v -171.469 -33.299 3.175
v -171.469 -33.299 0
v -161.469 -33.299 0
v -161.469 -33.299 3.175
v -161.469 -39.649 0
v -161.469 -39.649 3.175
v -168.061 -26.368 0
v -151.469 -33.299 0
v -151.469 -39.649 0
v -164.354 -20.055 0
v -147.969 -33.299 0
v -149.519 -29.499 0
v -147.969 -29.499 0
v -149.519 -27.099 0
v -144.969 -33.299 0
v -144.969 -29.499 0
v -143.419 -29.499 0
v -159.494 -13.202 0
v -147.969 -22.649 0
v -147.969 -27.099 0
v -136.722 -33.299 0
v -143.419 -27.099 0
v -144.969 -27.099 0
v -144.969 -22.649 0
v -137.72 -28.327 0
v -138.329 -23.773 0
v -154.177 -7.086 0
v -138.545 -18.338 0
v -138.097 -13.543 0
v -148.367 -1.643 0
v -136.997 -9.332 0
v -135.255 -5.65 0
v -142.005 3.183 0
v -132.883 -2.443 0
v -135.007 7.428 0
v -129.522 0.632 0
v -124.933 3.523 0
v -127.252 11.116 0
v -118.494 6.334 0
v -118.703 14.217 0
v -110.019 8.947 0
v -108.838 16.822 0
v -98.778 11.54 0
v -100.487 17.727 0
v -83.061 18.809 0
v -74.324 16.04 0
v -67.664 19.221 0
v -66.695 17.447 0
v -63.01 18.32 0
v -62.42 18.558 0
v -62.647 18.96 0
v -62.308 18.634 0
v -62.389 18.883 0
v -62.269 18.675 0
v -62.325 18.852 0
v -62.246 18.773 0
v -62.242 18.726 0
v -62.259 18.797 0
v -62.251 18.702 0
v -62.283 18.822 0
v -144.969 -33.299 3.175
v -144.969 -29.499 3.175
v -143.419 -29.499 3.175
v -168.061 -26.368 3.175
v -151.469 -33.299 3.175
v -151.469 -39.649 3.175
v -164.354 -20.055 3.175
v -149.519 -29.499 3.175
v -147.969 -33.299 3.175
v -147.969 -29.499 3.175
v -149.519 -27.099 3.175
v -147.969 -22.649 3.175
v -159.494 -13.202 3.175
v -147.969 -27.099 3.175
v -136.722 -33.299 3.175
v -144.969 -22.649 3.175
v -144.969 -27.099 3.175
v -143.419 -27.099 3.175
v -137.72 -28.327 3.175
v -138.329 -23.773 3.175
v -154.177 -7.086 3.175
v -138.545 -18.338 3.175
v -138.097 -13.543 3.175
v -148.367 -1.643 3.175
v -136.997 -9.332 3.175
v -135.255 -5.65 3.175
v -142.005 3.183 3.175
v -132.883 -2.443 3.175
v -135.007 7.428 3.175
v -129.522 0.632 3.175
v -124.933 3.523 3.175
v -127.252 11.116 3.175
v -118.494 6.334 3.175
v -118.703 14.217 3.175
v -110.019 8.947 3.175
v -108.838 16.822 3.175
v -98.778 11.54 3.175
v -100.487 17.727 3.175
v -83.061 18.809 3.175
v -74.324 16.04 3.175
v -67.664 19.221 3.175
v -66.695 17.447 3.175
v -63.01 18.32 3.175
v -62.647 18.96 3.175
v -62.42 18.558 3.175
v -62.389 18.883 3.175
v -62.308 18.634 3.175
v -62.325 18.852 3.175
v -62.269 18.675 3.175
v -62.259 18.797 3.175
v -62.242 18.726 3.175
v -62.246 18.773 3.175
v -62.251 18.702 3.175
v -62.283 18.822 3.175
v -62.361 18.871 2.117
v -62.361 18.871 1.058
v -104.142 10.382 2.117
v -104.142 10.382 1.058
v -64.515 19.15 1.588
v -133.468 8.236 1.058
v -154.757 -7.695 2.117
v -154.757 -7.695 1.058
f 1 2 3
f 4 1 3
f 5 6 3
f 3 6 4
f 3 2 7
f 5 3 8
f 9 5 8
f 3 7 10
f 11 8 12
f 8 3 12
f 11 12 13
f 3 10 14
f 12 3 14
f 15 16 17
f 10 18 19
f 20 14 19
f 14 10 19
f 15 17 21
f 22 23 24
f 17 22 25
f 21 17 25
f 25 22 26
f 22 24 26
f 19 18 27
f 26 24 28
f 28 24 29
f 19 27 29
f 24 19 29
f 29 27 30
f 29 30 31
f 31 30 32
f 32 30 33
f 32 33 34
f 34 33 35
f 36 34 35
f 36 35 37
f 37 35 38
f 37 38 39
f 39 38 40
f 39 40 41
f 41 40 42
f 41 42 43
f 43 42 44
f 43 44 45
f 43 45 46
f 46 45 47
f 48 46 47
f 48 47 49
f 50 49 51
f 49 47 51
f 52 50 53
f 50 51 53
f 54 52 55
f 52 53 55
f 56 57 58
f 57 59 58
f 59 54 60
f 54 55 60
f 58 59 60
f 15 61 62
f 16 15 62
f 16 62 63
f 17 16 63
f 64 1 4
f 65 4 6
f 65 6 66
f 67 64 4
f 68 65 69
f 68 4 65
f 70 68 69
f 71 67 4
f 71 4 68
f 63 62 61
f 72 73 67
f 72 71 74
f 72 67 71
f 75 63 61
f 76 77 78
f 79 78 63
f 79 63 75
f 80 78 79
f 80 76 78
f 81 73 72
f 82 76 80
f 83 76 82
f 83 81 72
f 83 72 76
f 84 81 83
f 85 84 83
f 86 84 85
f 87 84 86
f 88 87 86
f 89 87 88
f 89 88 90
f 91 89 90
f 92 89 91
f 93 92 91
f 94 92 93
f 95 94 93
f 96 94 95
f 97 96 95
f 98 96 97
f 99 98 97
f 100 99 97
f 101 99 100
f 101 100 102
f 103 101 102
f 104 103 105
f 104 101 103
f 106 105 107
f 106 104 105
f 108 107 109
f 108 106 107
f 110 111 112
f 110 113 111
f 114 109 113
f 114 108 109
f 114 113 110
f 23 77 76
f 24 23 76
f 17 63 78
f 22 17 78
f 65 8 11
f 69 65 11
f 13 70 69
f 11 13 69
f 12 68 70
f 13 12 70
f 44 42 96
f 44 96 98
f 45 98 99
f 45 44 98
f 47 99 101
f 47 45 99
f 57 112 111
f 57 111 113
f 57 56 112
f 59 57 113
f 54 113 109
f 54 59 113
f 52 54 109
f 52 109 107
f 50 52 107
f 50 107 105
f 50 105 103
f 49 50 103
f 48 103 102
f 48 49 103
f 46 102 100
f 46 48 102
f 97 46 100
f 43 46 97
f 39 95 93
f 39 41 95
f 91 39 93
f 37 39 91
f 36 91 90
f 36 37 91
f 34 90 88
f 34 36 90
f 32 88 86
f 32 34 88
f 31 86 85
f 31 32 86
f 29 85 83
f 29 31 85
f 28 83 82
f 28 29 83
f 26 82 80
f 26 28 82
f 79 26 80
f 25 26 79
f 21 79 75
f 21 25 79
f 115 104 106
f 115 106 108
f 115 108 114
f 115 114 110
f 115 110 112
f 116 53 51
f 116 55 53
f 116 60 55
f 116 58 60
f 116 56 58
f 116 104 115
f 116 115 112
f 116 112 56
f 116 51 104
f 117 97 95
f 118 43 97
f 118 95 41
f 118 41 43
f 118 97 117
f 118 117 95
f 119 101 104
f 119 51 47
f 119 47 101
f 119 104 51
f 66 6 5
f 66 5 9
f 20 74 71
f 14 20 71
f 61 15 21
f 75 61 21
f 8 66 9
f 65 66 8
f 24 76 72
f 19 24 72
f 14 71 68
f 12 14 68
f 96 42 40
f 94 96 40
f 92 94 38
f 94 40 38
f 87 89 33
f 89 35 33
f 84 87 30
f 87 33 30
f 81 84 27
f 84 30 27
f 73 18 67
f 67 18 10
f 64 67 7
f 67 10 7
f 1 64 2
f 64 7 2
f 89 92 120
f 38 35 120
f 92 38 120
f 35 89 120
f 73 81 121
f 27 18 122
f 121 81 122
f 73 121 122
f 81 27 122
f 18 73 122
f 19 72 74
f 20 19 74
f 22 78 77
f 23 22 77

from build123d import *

# Parameters (mm, degrees)
BOSS_EXTRUDE1_DEPTH = 3.175
SKETCH3_W           = 10
SKETCH3_H           = 6.35
BOSS_EXTRUDE2_DEPTH = 3.175
CUT_EXTRUDE2_DEPTH  = 177.022079196


with BuildPart() as part:
    # Sketch2 → Boss-Extrude1 (new body)
    with BuildSketch(Plane.XY):
        with BuildLine():
            Line((-171.469047232, -33.299180798), (-136.722420558, -33.299180798))
            add(Edge.make_bspline(
                [(-108.83788229, 16.821692005), (-99.669845231, 18.306784822), (-32.549173603, 21.473066917), (-123.012581298, 9.730472521), (-143.484345896, -3.902144784), (-136.722420558, -33.299180798)],
                knots=[0, 0, 0, 0, 0.306498188, 0.587227704, 1, 1, 1, 1], degree=3))
            add(Edge.make_bspline(
                [(-108.83788229, 16.821692005), (-134.727370928, 11.133168188), (-157.456147897, -2.082080449), (-171.469047232, -33.299180798)],
                knots=[0.527310124, 0.527310124, 0.527310124, 0.527310124, 1, 1, 1, 1], degree=3))
        make_face()
    extrude(amount=BOSS_EXTRUDE1_DEPTH)

    # Sketch3 → Boss-Extrude2 (add)
    with BuildSketch(Plane.XY.offset(3.175)):
        with Locations((-156.469047232, -36.474180798)):
            Rectangle(SKETCH3_W, SKETCH3_H)
    extrude(amount=-BOSS_EXTRUDE2_DEPTH)

    # Sketch5 → Cut-Extrude2 (cut, through all)
    with BuildSketch(Plane.XY.offset(3.175)):
        Polygon((-147.969047232, -33.299180798), (-144.969047232, -33.299180798), (-144.969047232, -29.499180798), (-143.419047232, -29.499180798), (-143.419047232, -27.099180798), (-144.969047232, -27.099180798), (-144.969047232, -22.649180798), (-147.969047232, -22.649180798), (-147.969047232, -27.099180798), (-149.519047232, -27.099180798), (-149.519047232, -29.499180798), (-147.969047232, -29.499180798), align=None)
    extrude(amount=-CUT_EXTRUDE2_DEPTH, mode=Mode.SUBTRACT)


solid = part.part
